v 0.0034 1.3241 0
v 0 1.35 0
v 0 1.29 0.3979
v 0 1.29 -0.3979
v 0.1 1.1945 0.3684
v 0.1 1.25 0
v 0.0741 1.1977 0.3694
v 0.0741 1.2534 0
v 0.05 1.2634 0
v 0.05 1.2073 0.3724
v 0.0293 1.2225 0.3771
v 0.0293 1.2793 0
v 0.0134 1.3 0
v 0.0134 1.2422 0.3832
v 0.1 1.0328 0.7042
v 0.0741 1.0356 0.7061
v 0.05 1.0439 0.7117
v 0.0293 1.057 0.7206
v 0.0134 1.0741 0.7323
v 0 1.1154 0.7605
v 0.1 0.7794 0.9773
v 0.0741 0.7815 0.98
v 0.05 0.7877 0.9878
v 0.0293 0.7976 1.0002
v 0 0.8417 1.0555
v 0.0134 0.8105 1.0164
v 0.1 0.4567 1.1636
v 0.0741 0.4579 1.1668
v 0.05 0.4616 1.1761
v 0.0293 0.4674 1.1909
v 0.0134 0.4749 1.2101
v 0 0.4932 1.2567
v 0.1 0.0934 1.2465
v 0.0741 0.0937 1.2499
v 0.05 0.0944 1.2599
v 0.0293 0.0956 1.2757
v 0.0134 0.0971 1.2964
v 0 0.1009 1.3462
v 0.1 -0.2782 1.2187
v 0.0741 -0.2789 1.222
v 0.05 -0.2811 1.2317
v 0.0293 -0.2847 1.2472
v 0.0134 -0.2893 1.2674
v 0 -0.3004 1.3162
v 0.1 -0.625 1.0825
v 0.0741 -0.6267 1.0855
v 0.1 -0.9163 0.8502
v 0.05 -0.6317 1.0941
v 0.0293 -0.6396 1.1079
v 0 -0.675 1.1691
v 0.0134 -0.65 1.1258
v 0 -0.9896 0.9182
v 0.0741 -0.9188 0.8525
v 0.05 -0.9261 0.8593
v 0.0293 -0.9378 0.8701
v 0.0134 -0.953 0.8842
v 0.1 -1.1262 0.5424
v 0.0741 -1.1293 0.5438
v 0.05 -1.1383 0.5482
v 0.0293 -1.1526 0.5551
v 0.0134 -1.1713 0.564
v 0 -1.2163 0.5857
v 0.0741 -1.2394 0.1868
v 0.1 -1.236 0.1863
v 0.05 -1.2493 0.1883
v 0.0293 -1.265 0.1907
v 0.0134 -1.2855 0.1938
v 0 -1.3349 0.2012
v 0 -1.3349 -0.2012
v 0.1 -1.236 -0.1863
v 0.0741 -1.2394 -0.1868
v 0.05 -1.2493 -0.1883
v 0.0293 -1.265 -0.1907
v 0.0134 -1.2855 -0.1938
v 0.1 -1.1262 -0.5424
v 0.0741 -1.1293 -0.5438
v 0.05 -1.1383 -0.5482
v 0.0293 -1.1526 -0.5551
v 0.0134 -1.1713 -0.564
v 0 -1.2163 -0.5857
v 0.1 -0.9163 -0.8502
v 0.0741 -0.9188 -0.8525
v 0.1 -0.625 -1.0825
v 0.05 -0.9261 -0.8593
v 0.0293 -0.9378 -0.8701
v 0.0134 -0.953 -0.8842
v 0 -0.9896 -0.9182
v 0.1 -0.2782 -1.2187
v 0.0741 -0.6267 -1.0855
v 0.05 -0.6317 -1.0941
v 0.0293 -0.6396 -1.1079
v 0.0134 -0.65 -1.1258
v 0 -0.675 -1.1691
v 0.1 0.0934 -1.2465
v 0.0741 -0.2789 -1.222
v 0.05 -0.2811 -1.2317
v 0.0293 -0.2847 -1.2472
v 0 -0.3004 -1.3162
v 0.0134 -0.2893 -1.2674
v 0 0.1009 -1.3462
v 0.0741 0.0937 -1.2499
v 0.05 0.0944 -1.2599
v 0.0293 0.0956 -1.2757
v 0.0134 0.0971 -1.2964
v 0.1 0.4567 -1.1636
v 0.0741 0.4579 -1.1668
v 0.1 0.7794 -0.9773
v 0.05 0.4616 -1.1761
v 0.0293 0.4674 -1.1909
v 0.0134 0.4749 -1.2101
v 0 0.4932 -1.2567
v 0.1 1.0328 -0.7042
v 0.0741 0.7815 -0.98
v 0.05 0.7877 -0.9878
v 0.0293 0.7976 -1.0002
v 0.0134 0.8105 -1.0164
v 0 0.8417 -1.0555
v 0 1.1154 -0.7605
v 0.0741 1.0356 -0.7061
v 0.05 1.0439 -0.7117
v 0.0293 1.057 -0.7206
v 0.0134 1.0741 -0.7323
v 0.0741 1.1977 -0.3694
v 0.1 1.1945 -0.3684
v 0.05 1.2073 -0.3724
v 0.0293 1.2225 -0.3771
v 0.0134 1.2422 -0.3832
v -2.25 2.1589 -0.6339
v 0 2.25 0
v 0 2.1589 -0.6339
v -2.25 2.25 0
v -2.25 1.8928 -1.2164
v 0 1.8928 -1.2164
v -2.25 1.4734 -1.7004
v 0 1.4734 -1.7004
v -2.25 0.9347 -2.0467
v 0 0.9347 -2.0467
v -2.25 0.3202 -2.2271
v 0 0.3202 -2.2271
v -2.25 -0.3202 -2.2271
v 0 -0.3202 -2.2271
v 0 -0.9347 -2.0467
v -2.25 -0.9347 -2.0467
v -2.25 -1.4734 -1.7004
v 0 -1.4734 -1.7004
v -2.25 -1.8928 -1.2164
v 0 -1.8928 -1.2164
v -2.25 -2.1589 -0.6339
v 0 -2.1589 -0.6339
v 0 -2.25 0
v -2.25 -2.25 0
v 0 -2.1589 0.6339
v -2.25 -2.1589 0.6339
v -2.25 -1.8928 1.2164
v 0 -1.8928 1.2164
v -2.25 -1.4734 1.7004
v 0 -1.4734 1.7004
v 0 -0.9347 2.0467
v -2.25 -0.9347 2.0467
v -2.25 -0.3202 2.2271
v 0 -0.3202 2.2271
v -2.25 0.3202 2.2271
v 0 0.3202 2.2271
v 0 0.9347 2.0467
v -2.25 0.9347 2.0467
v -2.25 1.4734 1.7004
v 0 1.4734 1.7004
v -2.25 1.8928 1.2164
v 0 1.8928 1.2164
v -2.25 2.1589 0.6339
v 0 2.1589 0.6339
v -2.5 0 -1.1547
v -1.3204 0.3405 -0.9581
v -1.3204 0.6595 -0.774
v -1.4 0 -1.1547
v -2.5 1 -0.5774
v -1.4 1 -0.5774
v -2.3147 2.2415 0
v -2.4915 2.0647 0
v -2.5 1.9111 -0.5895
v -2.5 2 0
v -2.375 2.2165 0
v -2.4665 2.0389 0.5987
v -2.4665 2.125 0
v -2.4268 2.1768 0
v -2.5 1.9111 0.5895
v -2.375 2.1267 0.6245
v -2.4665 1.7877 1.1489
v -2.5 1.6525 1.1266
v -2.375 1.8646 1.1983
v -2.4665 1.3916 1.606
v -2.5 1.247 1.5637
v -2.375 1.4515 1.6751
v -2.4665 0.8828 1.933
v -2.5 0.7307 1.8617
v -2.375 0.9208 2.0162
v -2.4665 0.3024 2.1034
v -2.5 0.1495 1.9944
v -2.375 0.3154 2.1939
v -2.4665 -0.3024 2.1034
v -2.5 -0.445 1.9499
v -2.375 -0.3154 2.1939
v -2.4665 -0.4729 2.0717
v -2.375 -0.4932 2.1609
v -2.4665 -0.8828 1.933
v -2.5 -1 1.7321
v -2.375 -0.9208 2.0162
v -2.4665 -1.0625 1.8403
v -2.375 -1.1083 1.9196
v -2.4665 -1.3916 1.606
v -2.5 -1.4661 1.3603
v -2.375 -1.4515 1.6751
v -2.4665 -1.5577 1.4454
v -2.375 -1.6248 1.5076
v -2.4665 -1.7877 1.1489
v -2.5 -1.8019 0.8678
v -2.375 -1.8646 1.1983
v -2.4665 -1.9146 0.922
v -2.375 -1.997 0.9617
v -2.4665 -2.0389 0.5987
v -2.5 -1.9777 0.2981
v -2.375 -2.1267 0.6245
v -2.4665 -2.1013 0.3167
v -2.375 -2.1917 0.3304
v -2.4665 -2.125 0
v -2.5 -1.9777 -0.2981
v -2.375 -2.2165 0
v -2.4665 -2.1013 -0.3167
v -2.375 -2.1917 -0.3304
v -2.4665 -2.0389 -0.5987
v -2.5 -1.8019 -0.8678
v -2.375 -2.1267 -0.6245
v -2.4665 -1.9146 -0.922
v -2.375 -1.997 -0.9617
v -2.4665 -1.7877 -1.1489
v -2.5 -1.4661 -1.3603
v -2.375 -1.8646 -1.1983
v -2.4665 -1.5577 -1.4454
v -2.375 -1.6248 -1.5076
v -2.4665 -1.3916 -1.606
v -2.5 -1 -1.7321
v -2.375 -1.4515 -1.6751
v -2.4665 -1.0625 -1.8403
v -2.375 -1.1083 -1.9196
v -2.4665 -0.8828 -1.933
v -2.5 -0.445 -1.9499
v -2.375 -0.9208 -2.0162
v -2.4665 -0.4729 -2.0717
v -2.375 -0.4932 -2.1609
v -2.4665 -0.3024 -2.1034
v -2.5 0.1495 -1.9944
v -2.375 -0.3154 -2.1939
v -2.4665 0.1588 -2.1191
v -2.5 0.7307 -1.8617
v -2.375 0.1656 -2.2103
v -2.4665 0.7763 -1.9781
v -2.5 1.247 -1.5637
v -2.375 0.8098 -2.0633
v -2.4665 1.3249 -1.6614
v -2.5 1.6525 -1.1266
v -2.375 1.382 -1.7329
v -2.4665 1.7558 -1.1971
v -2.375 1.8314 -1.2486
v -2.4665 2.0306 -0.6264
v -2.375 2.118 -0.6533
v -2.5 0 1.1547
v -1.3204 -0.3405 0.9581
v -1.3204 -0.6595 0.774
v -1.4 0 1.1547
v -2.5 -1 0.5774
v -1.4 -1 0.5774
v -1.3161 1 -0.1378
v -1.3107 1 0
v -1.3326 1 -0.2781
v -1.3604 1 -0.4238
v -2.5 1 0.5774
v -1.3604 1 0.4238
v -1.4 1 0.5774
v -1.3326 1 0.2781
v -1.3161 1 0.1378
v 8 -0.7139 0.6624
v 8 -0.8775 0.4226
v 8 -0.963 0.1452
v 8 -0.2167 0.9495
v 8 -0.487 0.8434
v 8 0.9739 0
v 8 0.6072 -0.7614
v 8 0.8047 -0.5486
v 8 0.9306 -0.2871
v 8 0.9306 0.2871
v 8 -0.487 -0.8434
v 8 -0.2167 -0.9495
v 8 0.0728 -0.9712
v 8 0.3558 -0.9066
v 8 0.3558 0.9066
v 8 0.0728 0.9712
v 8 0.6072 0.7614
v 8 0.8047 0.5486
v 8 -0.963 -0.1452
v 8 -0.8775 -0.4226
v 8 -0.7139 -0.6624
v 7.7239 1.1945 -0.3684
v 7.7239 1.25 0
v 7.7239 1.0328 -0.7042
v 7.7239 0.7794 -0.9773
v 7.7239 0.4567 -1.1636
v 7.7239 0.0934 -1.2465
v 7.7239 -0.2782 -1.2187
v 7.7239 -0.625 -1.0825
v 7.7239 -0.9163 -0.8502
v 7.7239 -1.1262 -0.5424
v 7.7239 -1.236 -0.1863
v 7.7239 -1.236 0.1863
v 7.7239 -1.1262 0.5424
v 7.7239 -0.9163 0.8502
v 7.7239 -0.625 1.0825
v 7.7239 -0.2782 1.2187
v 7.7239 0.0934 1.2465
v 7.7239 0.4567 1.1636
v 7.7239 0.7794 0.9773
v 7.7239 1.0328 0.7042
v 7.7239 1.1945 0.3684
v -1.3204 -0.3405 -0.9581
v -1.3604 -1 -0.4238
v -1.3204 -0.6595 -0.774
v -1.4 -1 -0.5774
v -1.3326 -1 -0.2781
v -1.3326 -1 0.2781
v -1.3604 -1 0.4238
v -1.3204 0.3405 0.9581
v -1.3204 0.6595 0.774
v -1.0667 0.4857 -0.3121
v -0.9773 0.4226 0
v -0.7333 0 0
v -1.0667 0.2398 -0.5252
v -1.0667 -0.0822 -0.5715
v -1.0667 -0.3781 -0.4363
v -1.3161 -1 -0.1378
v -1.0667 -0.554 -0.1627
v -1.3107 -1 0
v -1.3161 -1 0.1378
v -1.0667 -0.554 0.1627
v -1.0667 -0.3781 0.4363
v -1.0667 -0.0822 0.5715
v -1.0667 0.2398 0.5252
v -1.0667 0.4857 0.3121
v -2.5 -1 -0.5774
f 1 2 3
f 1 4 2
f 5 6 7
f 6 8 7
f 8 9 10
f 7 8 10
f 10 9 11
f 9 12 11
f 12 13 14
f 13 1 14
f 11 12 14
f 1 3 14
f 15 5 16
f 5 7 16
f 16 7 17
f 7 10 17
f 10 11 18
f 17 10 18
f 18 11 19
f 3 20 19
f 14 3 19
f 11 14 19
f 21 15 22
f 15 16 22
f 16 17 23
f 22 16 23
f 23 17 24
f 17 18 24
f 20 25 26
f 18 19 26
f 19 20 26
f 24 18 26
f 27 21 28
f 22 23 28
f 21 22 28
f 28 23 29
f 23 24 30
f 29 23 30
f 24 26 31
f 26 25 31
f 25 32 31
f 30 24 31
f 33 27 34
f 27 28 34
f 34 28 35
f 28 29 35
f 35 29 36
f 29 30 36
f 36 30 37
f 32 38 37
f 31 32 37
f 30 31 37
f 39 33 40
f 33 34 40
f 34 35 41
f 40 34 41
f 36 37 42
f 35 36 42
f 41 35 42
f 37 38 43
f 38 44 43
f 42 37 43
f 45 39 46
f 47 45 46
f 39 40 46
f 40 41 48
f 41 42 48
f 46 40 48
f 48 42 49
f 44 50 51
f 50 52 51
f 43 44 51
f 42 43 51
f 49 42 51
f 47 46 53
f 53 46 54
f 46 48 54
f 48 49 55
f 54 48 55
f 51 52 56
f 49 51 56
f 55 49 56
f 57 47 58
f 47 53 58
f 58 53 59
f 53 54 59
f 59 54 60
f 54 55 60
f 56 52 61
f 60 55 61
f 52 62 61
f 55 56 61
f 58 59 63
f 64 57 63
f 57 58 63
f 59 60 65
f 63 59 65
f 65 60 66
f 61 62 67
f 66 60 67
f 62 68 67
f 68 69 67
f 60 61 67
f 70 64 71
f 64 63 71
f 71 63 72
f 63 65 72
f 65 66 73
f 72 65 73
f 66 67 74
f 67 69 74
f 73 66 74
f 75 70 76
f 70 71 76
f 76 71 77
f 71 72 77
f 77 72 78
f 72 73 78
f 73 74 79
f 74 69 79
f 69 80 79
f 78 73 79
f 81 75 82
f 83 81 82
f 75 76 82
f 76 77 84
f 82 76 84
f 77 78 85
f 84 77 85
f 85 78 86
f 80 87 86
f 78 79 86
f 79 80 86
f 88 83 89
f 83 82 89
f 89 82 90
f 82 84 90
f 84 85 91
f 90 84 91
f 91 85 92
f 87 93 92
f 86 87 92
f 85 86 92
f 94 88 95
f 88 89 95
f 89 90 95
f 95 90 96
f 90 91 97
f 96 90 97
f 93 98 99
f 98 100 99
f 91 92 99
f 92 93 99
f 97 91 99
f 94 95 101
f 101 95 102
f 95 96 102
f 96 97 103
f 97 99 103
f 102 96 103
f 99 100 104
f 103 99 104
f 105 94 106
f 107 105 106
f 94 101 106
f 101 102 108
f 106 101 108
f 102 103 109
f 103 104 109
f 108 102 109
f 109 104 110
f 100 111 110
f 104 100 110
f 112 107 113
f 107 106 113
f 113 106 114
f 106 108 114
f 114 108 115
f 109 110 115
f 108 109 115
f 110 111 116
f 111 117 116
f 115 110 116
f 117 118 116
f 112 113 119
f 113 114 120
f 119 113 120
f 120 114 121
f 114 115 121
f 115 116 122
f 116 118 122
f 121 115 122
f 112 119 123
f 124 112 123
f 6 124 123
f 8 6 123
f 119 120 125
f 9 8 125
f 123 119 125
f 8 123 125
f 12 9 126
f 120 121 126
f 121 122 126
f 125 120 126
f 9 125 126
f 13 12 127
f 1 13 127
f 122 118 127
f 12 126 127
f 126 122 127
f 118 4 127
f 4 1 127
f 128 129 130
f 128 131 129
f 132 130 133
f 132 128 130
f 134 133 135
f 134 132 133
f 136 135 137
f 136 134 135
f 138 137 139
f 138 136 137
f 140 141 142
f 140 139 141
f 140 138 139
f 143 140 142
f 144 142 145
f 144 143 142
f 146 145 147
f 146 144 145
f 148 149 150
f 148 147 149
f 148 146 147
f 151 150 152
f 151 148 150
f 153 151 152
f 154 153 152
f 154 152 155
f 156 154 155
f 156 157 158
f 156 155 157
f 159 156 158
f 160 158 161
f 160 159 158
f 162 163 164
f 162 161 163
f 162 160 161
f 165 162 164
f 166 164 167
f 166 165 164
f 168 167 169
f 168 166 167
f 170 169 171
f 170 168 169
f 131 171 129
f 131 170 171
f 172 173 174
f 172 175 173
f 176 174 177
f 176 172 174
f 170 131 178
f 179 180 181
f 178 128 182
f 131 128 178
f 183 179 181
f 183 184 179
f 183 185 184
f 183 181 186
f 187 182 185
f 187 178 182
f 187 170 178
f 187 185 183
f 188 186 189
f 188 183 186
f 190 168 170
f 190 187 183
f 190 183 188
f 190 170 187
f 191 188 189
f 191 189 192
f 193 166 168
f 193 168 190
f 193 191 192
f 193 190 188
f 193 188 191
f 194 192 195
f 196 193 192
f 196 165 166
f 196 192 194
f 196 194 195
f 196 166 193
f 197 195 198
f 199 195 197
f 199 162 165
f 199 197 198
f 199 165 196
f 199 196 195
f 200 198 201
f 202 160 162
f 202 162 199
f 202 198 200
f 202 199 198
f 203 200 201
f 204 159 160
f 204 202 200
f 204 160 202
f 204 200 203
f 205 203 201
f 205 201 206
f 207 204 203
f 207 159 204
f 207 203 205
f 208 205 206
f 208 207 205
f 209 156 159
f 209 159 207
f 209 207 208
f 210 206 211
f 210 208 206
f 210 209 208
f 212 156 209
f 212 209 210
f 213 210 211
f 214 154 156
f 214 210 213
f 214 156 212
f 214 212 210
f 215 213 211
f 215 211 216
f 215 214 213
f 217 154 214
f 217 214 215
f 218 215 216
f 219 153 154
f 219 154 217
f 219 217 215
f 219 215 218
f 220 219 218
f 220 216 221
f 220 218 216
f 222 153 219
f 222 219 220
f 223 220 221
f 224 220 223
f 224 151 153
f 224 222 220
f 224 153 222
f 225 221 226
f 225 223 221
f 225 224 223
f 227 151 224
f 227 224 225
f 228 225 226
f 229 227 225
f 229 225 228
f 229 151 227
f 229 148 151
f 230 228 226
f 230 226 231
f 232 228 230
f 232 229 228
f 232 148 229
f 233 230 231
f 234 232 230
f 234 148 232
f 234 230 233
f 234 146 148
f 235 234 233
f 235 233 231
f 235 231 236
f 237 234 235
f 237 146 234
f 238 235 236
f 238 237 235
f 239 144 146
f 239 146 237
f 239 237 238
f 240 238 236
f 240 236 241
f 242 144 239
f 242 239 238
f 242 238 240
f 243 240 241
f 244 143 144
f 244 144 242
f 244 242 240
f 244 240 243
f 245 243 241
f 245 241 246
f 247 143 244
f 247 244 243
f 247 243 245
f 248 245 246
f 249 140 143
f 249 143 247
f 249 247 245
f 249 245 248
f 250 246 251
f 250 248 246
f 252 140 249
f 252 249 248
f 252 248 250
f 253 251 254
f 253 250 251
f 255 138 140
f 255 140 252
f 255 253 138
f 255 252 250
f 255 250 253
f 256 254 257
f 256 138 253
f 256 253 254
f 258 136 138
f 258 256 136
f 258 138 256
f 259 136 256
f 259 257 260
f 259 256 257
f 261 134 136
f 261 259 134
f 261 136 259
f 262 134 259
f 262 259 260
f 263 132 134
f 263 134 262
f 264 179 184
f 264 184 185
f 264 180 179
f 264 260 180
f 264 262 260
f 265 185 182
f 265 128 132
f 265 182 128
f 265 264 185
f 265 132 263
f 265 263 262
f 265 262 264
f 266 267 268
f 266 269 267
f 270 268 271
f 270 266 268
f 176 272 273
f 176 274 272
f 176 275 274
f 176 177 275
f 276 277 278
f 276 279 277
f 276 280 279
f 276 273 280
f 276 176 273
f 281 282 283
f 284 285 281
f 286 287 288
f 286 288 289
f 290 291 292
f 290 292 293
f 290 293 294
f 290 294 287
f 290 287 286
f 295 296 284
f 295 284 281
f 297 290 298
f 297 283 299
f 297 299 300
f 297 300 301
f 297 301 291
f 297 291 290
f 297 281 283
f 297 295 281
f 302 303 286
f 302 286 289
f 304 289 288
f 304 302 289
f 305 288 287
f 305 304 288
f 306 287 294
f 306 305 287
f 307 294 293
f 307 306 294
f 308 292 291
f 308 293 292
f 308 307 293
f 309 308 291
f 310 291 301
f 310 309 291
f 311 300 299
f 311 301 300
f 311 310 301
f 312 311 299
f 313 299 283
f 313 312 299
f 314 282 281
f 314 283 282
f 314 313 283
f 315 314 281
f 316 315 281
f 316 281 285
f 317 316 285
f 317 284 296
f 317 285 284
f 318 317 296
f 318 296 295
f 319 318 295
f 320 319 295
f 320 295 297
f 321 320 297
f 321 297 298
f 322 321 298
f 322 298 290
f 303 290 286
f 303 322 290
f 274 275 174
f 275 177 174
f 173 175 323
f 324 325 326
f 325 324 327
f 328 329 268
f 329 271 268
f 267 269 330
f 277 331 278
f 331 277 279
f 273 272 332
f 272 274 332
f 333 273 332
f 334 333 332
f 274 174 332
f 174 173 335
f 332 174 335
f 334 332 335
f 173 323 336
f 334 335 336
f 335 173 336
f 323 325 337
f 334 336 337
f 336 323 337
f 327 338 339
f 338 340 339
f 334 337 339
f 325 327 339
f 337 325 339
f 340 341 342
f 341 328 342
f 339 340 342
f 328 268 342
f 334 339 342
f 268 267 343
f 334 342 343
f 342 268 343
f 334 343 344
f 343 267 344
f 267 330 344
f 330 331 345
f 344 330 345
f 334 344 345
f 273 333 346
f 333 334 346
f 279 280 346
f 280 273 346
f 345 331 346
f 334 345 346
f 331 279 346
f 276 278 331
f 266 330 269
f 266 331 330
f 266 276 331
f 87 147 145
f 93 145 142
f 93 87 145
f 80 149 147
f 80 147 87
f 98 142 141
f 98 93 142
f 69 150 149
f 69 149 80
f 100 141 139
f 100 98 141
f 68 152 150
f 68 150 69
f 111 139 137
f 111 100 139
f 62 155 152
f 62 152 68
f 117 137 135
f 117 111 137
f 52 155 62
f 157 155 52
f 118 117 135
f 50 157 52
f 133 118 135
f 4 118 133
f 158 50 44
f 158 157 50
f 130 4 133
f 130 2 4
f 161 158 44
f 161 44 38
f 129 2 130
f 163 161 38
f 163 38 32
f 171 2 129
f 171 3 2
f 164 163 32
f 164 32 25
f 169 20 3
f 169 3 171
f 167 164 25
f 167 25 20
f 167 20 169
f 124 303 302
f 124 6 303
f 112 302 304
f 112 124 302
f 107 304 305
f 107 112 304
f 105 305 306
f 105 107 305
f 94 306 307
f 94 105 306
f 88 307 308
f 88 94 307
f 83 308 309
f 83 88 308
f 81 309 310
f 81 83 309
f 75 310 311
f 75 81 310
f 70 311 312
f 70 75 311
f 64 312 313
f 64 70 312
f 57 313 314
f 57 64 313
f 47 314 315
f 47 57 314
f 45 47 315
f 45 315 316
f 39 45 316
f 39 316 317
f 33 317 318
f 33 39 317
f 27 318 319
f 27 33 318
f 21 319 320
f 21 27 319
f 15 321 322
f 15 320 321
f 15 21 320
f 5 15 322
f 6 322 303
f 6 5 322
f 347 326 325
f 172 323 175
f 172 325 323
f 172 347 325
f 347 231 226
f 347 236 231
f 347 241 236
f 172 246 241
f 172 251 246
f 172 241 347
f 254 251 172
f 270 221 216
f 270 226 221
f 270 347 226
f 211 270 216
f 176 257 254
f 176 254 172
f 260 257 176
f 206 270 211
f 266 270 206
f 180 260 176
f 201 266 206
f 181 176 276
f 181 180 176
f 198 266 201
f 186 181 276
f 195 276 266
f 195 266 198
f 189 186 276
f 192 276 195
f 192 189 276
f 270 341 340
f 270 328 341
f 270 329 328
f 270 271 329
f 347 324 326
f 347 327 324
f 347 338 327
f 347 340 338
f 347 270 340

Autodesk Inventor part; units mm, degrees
ref_plane "YZ Plane" through (0, 0, 0) normal (1, 0, 0) x (0, 1, 0)
ref_plane "XZ Plane" through (0, 0, 0) normal (0, 1, 0) x (-1, 0, 0)
sketch "スケッチ1" plane through (0, 0, 0) normal (0, 0, 1) x (1, 0, 0)
  line L0 (-0.7333, 0) -> (8, 0)
  line L1 (8, 0) -> (8, 1.25)
  line L2 (8, 1.25) -> (1.35, 1.25)
  line L3 (1.35, 1.25) -> (1.0738, 1.25)
  line L4 (1.0738, 1.25) -> (0, 1.25)
  line L5 (0, 1.25) -> (0, 2.25)
  line L6 (0, 2.25) -> (-2.5, 2.25)
  line L7 (-2.5, 2.25) -> (-2.5, 1.1547)
  line L8 (-2.5, 1.1547) -> (-1.4, 1.1547)
  line L9 (-1.4, 1.1547) -> (-0.7333, 0)
  line L10 (-4.6, 0) -> (10.1, 0) projected
  line L11 (0, -0.45) -> (0, 2.7) projected
  line L12 (1.35, 1.25) -> (0, 1.25) construction
  dimension "d1" = 6.65
  dimension "d2" = 0.2762
  dimension "d3" = 2.5
  dimension "d4" = 1.1
  dimension "d5" = 60
  dimension "d6" = 2.5
  dimension "d7" = 2.5
  dimension "d8" = 2.3094
  dimension "d9" = 4.5
  dimension "d26" = 8
revolve "ボディ" add sketch "スケッチ1" angle 360 about axis through (-0.7333, 0, 0) along (1, 0, 0)
sketch "スケッチ2" plane through (-2.5, 0, 0) normal (-1, 0, 0) x (0, 0, 1)
  circle A0 centre (0, 0) radius 1.1547 projected
  line L0 (0, -3.15) -> (0, 3.15) projected
  line L1 (-3.15, 0) -> (3.15, 0) projected
  line L2 (1.1547, 0) -> (0.5774, -1)
  line L3 (0.5774, -1) -> (-0.5774, -1)
  line L4 (-0.5774, -1) -> (-1.1547, 0)
  line L5 (-1.1547, 0) -> (-0.5774, 1)
  line L6 (-0.5774, 1) -> (0.5774, 1)
  line L7 (0.5774, 1) -> (1.1547, 0)
extrude "長穴" add sketch "スケッチ2" against normal up to next contours L7 A0 | A0 L2 | L6 L0 A0 | A0 L0 L3 | L0 L6 A0 | A0 L3 L0 | L4 A0 | A0 L5
fillet "フィレット1" radius 0.25 1 edges at (-2.5, -2.25, 0)
thread "ねじ" size "M2.5x0.45" class "6g" standard "ISO Metric profile" length 6.65
chamfer "面取り1" distance 0.2761 distance2 0.2761 1 edges at (8, -1.25, 0) measured on face at (8, 0.4797, 0.7189)
ref_plane "Work Plane1" through (29, 0, 0) normal (0, -1, 0) x (1, 0, 0)
fillet "Fillet2" radius 0.1 1 edges at (0, -1.25, 0)
equation "\"d30\" = R"
equation "\"d17\" = RR"
equation "\"d13\" = GEL"
equation "\"d15\" = -0.5 * SPD + 0.5 * GD"
equation "\"d16\" = GUL"
equation "\"d1\" = GEL"
equation "\"d3\" = KOH"
equation "\"d4\" = INTI"
equation "\"d6\" = GD"
equation "\"d7\" = BDM"
equation "\"d8\" = 1.1547 * SW"
equation "\"d9\" = KOD"
equation "\"d26\" = NLG"
equation "\"GD\" = NND"
equation "\"NLG\" = 8"
equation "\"GEL\" = 6.65"
equation "\"KOD\" = 4.5"
equation "\"KOH\" = 2.5"
equation "\"INTI\" = 1.1"
equation "\"GAL\" = 0.61345 * PTC"
equation "\"GUL\" = 0.61345 * PTC"
equation "\"BDM\" = NND"
equation "\"SW\" = 2"
equation "\"RR\" = 0.25"
equation "\"SPD\" = NND - 1.2269 * PTC"
equation "\"R\" = 0.1"
equation "\"PHH\" = 0.1"
equation "\"GD1\" = THREADDIA - 1.2269 * PTC"
equation "\"THREADDIA\" = 2.5"
equation "\"FAWI\" = 45deg"
equation "\"PTC\" = 0.45"
equation "\"NND\" = 2.5"
equation "\"TOA\" = 30deg"
equation "\"E0\" = 1.155 * SW"
properties part number "JIS B 1176 - M2.5 x 8" material "鋼、軟鋼"
